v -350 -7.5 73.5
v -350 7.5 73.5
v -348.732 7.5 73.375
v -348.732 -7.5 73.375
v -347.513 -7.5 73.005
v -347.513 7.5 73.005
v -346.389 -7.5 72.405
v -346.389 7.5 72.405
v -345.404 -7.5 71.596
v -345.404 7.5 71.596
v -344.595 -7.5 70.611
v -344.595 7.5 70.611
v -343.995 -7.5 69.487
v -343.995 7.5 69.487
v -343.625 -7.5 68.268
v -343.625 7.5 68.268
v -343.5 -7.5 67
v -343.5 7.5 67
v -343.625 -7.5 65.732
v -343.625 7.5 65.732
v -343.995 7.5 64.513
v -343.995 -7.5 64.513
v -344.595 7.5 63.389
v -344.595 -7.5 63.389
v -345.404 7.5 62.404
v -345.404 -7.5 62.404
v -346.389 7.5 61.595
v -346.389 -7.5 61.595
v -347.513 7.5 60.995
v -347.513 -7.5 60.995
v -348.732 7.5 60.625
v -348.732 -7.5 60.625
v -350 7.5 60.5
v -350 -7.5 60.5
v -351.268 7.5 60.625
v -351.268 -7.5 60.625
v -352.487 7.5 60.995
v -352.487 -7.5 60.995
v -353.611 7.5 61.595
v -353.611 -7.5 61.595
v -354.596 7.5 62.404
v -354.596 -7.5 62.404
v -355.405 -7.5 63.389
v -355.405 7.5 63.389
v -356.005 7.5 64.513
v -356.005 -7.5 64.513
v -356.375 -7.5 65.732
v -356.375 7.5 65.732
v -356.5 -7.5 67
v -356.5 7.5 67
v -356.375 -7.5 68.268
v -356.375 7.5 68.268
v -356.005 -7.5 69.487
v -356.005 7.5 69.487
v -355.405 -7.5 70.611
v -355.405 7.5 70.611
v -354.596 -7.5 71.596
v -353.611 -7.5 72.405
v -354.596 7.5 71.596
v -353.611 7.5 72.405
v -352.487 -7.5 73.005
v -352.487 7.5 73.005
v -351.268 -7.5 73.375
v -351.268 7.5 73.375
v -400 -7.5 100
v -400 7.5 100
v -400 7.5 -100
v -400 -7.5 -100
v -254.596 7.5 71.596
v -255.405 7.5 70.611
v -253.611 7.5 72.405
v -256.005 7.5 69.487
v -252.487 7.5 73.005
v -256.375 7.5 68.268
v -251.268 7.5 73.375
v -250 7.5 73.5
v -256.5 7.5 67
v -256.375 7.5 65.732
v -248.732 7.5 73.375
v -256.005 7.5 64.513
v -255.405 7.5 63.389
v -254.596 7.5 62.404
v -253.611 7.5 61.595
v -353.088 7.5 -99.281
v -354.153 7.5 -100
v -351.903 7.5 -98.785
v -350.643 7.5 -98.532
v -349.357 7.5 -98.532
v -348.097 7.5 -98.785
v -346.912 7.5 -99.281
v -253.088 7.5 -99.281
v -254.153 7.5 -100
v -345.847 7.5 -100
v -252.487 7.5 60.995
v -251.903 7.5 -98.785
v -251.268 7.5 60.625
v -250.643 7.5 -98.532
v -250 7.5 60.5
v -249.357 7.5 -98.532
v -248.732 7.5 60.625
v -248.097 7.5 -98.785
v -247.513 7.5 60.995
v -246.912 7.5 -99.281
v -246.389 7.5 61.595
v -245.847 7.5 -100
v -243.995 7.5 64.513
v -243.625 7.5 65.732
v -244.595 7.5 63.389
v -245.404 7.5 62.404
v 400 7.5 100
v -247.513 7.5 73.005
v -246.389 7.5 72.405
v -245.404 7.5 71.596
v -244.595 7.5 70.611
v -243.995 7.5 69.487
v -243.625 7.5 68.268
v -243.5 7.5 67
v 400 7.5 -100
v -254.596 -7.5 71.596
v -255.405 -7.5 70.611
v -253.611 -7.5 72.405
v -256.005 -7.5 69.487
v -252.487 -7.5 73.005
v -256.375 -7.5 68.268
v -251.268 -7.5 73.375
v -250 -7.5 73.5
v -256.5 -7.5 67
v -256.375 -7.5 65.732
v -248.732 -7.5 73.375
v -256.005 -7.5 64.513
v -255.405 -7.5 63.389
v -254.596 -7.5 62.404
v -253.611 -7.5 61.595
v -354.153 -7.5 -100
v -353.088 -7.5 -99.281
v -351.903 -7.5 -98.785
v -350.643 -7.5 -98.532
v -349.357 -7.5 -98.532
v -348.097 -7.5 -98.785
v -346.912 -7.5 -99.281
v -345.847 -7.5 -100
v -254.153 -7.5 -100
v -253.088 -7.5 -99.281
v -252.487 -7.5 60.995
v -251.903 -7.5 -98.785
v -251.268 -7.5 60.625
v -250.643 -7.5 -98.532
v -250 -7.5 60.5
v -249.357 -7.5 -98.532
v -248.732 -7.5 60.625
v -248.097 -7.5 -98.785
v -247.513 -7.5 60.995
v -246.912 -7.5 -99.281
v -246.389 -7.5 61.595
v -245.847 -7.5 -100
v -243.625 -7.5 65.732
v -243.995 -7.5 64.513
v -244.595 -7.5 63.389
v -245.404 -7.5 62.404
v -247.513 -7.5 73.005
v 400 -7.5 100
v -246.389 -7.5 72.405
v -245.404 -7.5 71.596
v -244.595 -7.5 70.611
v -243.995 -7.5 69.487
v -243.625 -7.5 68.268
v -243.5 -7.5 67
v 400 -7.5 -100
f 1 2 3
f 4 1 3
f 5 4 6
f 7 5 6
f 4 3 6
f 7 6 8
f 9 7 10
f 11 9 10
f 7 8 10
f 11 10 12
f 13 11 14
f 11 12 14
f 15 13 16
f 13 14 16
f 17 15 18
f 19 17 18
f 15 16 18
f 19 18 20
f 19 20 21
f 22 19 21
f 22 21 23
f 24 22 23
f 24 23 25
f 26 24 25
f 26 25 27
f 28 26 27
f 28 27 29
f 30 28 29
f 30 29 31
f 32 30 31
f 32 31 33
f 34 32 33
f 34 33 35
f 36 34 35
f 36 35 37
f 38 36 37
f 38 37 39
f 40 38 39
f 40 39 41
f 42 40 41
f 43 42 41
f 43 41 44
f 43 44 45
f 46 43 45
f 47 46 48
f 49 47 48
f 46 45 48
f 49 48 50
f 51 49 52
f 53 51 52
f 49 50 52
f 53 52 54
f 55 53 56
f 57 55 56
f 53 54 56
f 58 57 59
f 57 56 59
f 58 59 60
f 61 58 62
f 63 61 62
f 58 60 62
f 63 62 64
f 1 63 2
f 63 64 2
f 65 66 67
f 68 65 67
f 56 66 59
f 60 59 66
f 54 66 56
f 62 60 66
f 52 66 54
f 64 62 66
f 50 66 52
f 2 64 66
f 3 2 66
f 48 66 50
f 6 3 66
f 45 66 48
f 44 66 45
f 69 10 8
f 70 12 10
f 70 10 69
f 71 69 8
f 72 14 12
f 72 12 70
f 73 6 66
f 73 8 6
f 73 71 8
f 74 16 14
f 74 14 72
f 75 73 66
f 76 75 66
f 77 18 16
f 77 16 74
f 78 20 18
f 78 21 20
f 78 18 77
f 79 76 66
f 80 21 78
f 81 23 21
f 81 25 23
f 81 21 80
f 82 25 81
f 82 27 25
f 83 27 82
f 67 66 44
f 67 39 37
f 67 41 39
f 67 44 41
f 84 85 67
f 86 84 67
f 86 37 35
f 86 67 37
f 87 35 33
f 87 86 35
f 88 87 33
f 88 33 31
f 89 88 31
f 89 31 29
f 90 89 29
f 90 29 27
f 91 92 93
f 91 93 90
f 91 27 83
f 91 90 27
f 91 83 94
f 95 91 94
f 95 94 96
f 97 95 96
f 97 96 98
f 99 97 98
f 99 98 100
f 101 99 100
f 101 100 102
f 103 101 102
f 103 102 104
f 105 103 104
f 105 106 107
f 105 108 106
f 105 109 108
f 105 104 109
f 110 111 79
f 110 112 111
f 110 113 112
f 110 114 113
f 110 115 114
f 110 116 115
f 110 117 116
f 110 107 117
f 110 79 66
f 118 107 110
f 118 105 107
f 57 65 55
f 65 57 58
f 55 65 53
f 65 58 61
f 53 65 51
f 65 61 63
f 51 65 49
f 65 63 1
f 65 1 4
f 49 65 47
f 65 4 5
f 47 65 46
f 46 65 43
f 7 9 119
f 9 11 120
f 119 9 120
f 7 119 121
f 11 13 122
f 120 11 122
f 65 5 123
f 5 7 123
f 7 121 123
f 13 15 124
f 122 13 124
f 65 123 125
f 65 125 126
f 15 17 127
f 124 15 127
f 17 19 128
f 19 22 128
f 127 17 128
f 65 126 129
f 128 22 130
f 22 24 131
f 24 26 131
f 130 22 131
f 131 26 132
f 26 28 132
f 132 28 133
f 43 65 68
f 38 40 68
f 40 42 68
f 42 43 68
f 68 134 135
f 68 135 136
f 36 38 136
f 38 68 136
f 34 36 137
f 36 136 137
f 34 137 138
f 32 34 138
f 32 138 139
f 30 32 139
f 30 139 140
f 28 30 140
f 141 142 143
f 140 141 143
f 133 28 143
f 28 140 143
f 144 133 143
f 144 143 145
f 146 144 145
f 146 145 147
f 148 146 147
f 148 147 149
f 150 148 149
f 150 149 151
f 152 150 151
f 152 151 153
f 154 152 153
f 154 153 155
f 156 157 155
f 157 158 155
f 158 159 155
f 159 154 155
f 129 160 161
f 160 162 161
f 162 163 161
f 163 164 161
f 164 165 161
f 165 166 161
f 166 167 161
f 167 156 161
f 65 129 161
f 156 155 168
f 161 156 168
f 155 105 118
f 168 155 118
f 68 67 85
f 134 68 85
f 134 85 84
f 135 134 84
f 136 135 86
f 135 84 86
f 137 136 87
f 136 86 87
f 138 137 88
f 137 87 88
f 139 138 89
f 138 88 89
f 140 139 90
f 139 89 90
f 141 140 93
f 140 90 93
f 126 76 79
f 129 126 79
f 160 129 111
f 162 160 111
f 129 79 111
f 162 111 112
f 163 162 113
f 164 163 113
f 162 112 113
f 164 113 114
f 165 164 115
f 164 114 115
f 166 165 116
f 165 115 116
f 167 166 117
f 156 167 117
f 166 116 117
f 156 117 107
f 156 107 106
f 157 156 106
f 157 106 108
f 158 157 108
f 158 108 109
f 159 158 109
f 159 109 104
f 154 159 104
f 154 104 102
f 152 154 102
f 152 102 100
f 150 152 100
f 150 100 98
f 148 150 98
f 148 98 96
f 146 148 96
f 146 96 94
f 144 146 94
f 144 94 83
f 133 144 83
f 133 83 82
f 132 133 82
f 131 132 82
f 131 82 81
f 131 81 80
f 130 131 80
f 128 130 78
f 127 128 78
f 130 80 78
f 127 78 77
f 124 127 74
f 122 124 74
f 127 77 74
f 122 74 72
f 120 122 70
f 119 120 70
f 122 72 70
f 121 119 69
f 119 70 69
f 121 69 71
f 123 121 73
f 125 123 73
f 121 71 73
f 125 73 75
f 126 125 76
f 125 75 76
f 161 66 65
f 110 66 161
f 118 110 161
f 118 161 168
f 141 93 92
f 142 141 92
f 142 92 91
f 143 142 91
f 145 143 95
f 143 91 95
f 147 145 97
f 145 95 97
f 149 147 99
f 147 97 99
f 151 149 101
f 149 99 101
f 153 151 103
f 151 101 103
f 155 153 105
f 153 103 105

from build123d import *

# Parameters (mm, degrees)
SKETCH1_W           = 800
SKETCH1_H           = 200
BOSS_EXTRUDE1_DEPTH = 7.5
SKETCH2_R           = 6.5
CUT_EXTRUDE1_DEPTH  = 413.583324918


with BuildPart() as part:
    # Sketch1 → Boss-Extrude1 (new, symmetric)
    with BuildSketch(Plane(origin=(0, 0, 0), x_dir=(1, 0, 0), z_dir=(0, 1, 0))):
        Rectangle(SKETCH1_W, SKETCH1_H)
    extrude(amount=BOSS_EXTRUDE1_DEPTH, both=True)

    # Sketch2 → Cut-Extrude1 (cut, through all)
    with BuildSketch(Plane(origin=(0, 7.5, 0), x_dir=(1, 0, 0), z_dir=(0, 1, 0))):
        with Locations(Location((-350, -67, 0), (0, 0, 270))):
            Circle(SKETCH2_R)
        with Locations(Location((-250, -67, 0), (0, 0, 270))):
            Circle(SKETCH2_R)
        with Locations((-350, 105)):
            Circle(SKETCH2_R)
        with Locations((-250, 105)):
            Circle(SKETCH2_R)
    extrude(amount=-CUT_EXTRUDE1_DEPTH, mode=Mode.SUBTRACT)


solid = part.part
